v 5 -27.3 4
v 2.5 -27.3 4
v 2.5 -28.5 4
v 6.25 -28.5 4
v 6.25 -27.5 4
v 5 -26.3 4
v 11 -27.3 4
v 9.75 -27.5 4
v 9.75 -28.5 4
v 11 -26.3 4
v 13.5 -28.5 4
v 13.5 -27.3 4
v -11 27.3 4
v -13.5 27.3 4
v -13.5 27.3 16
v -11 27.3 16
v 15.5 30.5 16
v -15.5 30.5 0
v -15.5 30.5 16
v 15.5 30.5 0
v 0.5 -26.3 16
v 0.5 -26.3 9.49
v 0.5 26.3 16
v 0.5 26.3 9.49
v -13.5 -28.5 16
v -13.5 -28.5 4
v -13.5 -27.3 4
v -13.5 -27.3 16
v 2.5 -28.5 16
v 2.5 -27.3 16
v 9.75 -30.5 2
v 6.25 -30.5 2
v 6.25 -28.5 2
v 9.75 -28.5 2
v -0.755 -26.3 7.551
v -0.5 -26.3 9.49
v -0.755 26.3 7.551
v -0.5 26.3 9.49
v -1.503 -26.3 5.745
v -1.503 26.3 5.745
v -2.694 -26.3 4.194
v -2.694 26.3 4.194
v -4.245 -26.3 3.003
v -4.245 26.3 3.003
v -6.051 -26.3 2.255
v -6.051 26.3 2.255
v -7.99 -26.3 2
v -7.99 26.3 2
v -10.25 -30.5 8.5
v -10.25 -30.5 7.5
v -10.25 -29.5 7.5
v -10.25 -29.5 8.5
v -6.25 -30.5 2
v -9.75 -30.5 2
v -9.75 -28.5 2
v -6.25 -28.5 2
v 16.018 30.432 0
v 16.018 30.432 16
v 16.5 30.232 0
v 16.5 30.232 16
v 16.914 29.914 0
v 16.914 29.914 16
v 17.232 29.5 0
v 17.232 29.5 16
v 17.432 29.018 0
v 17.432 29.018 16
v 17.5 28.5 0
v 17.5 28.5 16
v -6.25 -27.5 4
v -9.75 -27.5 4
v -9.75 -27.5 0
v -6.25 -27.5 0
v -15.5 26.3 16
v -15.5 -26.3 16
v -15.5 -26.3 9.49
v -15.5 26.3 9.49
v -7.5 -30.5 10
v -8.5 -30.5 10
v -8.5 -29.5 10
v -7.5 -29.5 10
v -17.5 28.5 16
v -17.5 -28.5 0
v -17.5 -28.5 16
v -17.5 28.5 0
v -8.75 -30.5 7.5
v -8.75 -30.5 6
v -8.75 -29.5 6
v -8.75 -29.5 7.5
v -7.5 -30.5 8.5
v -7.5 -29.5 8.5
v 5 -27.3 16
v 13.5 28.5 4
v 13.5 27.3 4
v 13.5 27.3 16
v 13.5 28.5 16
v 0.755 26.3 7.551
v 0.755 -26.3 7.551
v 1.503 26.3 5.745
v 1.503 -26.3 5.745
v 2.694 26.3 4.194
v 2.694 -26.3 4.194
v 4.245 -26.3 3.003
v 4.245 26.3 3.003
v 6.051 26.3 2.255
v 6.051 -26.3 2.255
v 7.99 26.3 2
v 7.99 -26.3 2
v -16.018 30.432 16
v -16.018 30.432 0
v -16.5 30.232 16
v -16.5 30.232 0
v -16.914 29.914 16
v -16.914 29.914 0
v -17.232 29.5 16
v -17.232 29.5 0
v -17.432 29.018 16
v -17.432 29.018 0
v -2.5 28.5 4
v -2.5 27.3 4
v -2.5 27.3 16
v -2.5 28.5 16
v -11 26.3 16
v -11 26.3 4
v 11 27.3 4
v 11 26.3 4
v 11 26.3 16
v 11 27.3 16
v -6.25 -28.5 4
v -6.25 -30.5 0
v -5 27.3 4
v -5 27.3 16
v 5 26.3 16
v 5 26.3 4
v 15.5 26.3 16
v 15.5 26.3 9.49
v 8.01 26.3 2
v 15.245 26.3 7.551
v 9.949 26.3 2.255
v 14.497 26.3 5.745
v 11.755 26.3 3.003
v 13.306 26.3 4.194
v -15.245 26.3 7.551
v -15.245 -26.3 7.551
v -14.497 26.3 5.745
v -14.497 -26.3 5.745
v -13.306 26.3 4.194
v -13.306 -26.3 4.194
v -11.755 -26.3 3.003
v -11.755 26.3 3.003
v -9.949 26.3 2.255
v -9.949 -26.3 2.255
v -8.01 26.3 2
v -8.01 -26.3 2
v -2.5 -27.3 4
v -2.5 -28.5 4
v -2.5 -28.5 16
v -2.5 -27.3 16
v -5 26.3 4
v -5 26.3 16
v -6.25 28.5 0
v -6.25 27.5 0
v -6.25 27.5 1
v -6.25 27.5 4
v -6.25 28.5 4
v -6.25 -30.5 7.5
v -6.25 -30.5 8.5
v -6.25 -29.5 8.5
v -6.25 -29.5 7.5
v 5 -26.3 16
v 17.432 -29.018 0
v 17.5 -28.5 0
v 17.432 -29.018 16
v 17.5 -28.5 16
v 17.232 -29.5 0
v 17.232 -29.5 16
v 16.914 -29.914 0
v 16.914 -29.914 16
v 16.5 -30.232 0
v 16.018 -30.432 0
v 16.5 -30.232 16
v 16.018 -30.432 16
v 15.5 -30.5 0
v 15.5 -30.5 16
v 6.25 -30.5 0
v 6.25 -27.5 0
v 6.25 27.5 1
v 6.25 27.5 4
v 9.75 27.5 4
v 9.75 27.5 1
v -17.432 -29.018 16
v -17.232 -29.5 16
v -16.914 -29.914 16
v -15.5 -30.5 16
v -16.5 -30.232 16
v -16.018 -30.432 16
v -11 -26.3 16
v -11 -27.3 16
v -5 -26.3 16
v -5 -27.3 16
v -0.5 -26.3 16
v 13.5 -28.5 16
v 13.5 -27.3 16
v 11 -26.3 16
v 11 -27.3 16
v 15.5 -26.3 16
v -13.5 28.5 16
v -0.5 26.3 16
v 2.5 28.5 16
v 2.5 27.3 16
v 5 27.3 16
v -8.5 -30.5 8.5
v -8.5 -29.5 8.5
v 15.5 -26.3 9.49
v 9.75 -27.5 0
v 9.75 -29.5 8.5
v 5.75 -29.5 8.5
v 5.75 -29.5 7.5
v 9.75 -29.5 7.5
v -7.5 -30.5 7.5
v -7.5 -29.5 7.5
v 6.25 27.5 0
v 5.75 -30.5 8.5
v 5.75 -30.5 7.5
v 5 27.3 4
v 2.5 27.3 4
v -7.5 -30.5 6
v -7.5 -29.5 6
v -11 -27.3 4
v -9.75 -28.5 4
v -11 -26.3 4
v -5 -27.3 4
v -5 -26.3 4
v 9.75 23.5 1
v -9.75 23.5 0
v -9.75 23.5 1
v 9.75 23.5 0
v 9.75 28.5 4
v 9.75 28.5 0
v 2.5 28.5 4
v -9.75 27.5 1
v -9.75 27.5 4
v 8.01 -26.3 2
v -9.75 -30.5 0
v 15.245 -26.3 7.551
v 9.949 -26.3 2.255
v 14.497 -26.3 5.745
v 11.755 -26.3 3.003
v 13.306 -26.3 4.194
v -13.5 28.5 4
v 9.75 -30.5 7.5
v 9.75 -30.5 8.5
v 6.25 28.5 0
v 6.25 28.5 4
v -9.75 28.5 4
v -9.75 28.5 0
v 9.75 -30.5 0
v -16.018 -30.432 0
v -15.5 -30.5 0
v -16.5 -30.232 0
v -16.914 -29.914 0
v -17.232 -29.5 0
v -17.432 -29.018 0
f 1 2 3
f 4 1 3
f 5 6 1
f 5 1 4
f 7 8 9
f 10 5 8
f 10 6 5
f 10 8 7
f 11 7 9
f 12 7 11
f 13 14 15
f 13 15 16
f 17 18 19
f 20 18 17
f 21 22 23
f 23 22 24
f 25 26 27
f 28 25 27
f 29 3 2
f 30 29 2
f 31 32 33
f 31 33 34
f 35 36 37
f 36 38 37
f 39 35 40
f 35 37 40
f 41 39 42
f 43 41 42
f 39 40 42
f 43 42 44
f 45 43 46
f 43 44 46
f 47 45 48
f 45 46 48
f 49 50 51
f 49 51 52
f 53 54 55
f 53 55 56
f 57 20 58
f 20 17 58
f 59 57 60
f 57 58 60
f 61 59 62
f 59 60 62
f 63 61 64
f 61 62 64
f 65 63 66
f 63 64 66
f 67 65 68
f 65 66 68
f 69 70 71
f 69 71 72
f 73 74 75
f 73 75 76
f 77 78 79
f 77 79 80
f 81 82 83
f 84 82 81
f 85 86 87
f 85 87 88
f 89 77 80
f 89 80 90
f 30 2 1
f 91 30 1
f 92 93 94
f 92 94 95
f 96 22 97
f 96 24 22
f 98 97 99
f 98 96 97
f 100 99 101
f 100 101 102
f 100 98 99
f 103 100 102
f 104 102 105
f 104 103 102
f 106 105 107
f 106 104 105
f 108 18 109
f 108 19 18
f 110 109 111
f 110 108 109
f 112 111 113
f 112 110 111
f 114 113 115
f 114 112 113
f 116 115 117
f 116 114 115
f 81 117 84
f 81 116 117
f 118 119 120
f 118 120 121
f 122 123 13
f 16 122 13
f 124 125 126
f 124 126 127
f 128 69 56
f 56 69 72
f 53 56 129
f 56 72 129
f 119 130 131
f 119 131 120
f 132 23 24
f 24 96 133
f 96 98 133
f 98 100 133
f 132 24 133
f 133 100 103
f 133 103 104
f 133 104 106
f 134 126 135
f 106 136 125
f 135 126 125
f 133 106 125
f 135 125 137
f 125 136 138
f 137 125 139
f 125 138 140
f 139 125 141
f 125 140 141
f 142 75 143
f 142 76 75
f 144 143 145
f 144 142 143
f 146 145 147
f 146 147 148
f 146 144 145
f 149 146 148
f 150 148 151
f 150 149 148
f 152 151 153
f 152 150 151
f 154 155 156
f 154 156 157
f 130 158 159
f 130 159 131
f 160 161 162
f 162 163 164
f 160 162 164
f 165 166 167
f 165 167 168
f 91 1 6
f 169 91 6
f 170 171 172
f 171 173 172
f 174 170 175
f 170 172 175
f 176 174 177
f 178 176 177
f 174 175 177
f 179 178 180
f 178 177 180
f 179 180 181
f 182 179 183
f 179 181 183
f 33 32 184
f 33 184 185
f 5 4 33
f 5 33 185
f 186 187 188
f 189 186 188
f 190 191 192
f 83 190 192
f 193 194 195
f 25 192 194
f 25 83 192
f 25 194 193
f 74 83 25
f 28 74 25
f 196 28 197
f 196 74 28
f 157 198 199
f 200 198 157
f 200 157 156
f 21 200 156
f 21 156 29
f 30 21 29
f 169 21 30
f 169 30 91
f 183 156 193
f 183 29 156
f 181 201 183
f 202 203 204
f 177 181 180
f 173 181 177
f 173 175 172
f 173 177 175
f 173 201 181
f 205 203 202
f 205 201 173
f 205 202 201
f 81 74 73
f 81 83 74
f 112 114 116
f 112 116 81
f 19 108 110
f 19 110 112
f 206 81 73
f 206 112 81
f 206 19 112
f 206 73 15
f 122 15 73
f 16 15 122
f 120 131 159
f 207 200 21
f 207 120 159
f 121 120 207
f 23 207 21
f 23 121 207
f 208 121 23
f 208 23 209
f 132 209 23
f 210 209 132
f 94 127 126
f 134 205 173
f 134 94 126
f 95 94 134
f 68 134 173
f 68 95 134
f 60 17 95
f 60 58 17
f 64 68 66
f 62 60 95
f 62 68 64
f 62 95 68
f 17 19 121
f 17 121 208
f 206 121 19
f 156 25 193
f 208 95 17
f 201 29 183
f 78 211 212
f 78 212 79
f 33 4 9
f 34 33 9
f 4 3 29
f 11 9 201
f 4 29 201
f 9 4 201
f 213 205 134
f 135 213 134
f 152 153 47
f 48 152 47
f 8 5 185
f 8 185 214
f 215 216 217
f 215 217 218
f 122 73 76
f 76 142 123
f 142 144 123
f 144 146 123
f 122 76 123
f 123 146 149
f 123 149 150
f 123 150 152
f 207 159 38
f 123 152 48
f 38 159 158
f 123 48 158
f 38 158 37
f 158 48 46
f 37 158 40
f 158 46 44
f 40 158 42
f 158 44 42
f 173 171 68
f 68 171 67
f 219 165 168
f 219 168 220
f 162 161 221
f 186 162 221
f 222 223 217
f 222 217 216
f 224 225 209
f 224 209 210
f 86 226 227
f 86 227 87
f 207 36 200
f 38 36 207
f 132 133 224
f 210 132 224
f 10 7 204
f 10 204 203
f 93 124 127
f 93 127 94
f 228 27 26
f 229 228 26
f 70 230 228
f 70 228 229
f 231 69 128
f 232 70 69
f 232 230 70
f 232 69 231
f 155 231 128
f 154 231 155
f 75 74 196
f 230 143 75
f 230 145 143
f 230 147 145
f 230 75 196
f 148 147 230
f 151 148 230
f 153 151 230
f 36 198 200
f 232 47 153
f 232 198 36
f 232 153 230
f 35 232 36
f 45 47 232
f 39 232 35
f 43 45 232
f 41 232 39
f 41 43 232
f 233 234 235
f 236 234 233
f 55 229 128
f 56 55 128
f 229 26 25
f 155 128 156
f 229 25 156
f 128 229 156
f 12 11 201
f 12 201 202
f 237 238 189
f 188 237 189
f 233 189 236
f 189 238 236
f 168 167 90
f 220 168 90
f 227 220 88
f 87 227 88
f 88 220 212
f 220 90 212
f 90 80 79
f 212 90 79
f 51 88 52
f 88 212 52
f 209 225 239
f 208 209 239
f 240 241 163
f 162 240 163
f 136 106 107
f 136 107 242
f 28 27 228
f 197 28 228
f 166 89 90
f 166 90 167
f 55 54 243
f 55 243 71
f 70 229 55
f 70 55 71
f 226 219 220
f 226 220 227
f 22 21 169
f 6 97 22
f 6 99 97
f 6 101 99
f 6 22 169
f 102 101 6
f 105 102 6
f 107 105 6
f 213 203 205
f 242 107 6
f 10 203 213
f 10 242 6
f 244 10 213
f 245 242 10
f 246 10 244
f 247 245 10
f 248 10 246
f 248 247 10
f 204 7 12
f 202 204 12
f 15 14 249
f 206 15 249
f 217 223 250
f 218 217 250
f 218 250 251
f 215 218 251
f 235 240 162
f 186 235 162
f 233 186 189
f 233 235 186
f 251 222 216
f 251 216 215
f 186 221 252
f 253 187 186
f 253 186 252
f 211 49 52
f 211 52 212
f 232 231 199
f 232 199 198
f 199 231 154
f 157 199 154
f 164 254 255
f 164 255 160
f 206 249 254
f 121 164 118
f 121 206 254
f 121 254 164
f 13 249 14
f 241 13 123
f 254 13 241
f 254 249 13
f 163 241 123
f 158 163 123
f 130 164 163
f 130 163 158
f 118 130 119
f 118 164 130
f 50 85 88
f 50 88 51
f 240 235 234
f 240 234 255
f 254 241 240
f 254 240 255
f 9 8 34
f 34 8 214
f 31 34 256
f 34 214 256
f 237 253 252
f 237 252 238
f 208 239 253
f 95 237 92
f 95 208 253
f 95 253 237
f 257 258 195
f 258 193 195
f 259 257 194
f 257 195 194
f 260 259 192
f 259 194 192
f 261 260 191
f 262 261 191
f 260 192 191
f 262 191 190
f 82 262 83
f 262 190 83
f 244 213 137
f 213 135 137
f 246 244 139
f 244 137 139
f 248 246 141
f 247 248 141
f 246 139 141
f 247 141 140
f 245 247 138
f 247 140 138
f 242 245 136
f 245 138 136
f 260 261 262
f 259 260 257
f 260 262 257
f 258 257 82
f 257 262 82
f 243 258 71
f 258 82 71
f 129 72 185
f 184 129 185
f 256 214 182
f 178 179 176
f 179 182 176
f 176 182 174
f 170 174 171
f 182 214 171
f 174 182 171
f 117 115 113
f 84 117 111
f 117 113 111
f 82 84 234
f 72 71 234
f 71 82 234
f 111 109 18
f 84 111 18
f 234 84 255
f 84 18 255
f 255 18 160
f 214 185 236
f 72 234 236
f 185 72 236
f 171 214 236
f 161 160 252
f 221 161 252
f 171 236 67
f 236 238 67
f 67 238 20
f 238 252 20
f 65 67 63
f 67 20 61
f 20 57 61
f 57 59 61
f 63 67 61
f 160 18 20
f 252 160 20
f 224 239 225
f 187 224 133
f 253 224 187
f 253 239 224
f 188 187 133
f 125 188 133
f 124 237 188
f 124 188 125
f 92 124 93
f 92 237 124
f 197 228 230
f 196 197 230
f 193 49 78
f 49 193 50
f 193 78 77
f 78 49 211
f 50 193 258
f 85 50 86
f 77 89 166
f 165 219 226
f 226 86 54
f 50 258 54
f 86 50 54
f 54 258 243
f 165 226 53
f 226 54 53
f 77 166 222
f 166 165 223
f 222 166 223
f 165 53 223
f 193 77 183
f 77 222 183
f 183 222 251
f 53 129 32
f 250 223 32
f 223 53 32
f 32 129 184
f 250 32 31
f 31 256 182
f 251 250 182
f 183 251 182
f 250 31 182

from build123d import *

# Parameters (mm, degrees)
SKETCH_W        = 35
SKETCH_H        = 61
PAD_DEPTH       = 16
SKETCH001_W     = 31
SKETCH001_H     = 57
POCKET_DEPTH    = 14
SKETCH002_W     = 1
SKETCH002_H     = 57
PAD001_DEPTH    = 14
SKETCH003_W     = 15
SKETCH003_H     = 2.2
PAD002_DEPTH    = 2
SKETCH004_W     = 3.5
SKETCH004_H     = 1
POCKET001_DEPTH = 5
SKETCH005_W     = 4.5
SKETCH005_H     = 1
PAD003_DEPTH    = 12
FILLET_R        = 2
FILLET001_R     = 7.49
SKETCH006_W     = 2
SKETCH006_H     = 1.2
PAD004_DEPTH    = 12
SKETCH007_W     = 3.5
SKETCH007_H     = 2
POCKET002_DEPTH = 2
SKETCH008_W     = 4
SKETCH008_H     = 1
POCKET003_DEPTH = 1
SKETCH009_W     = 19.5
SKETCH009_H     = 4
POCKET004_DEPTH = 1


with BuildPart() as part:
    # Sketch → Pad (new body)
    with BuildSketch(Plane.XY):
        Rectangle(SKETCH_W, SKETCH_H)
    extrude(amount=PAD_DEPTH)

    # Sketch001 (on Face6 of Pad) → Pocket (cut)
    with BuildSketch(Plane.XY.offset(16)):
        Rectangle(SKETCH001_W, SKETCH001_H)
    extrude(amount=-POCKET_DEPTH, mode=Mode.SUBTRACT)

    # Sketch002 (on Face11 of Pocket) → Pad001 (join)
    with BuildSketch(Plane.XY.offset(2)):
        Rectangle(SKETCH002_W, SKETCH002_H)
    extrude(amount=PAD001_DEPTH)

    # Sketch003 (on Face17 of Pad001) → Pad002 (join)
    with BuildSketch(Plane.XY.offset(2)):
        with Locations((8, 27.4)):
            Rectangle(SKETCH003_W, SKETCH003_H)
        with Locations((-8, 27.4)):
            Rectangle(SKETCH003_W, SKETCH003_H)
        with Locations((8, -27.4)):
            Rectangle(SKETCH003_W, SKETCH003_H)
        with Locations((-8, -27.4)):
            Rectangle(SKETCH003_W, SKETCH003_H)
    extrude(amount=PAD002_DEPTH)

    # Sketch004 (on Face22 of Pad002) → Pocket001 (cut)
    with BuildSketch(Plane.XY.offset(4)):
        with Locations((8, 28)):
            Rectangle(SKETCH004_W, SKETCH004_H)
        with Locations((-8, 28)):
            Rectangle(SKETCH004_W, SKETCH004_H)
        with Locations((8, -28)):
            Rectangle(SKETCH004_W, SKETCH004_H)
        with Locations((-8, -28)):
            Rectangle(SKETCH004_W, SKETCH004_H)
    extrude(amount=-POCKET001_DEPTH, mode=Mode.SUBTRACT)

    # Sketch005 (on Face30 of Pocket001) → Pad003 (join)
    with BuildSketch(Plane.XY.offset(4)):
        with Locations((-2.75, 26.8)):
            Rectangle(SKETCH005_W, SKETCH005_H)
        with Locations((-13.25, 26.8)):
            Rectangle(SKETCH005_W, SKETCH005_H)
        with Locations((2.75, 26.8)):
            Rectangle(SKETCH005_W, SKETCH005_H)
        with Locations((13.25, 26.8)):
            Rectangle(SKETCH005_W, SKETCH005_H)
        with Locations((13.25, -26.8)):
            Rectangle(SKETCH005_W, SKETCH005_H)
        with Locations((-13.25, -26.8)):
            Rectangle(SKETCH005_W, SKETCH005_H)
        with Locations((-2.75, -26.8)):
            Rectangle(SKETCH005_W, SKETCH005_H)
        with Locations((2.75, -26.8)):
            Rectangle(SKETCH005_W, SKETCH005_H)
    extrude(amount=PAD003_DEPTH)

    # Fillet
    fillet_edges = [part.edges().sort_by_distance(p)[0] for p in [
        (-17.5, 30.5, 8),
        (17.5, 30.5, 8),
        (17.5, -30.5, 8),
        (-17.5, -30.5, 8),
    ]]
    fillet(fillet_edges, radius=FILLET_R)

    # Fillet001
    fillet001_edges = [part.edges().sort_by_distance(p)[0] for p in [
        (-15.5, 0, 2),
        (-0.5, 0, 2),
        (0.5, 0, 2),
        (15.5, 0, 2),
    ]]
    fillet(fillet001_edges, radius=FILLET001_R)

    # Sketch006 (on Face36 of Fillet001) → Pad004 (join)
    with BuildSketch(Plane.XY.offset(4)):
        with Locations((-14.5, 27.9)):
            Rectangle(SKETCH006_W, SKETCH006_H)
        with Locations((-1.5, 27.9)):
            Rectangle(SKETCH006_W, SKETCH006_H)
        with Locations((1.5, 27.9)):
            Rectangle(SKETCH006_W, SKETCH006_H)
        with Locations((14.5, 27.9)):
            Rectangle(SKETCH006_W, SKETCH006_H)
        with Locations((14.5, -27.9)):
            Rectangle(SKETCH006_W, SKETCH006_H)
        with Locations((1.5, -27.9)):
            Rectangle(SKETCH006_W, SKETCH006_H)
        with Locations((-1.5, -27.9)):
            Rectangle(SKETCH006_W, SKETCH006_H)
        with Locations((-14.5, -27.9)):
            Rectangle(SKETCH006_W, SKETCH006_H)
    extrude(amount=PAD004_DEPTH)

    # Sketch007 (on Face2 of Fillet) → Pocket002 (cut)
    with BuildSketch(Plane(origin=(0, 0, 0), x_dir=(1, 0, 0), z_dir=(0, 0, -1))):
        with Locations((-8, 29.5)):
            Rectangle(SKETCH007_W, SKETCH007_H)
        with Locations((8, 29.5)):
            Rectangle(SKETCH007_W, SKETCH007_H)
    extrude(amount=-POCKET002_DEPTH, mode=Mode.SUBTRACT)

    # Sketch008 (on Face14 of Pocket002) → Pocket003 (cut)
    with BuildSketch(Plane.XZ.offset(30.5)):
        Polygon((-10.25, 8.5), (-8.5, 8.5), (-8.5, 10), (-7.5, 10), (-7.5, 8.5), (-6.25, 8.5), (-6.25, 7.5), (-7.5, 7.5), (-7.5, 6), (-8.75, 6), (-8.75, 7.5), (-10.25, 7.5), align=None)
        with Locations((7.75, 8)):
            Rectangle(SKETCH008_W, SKETCH008_H)
    extrude(amount=-POCKET003_DEPTH, mode=Mode.SUBTRACT)

    # Sketch009 (on Face43 of Pocket003) → Pocket004 (cut)
    with BuildSketch(Plane(origin=(0, 0, 0), x_dir=(1, 0, 0), z_dir=(0, 0, -1))):
        with Locations((0, -25.5)):
            Rectangle(SKETCH009_W, SKETCH009_H)
    extrude(amount=-POCKET004_DEPTH, mode=Mode.SUBTRACT)


solid = part.part
